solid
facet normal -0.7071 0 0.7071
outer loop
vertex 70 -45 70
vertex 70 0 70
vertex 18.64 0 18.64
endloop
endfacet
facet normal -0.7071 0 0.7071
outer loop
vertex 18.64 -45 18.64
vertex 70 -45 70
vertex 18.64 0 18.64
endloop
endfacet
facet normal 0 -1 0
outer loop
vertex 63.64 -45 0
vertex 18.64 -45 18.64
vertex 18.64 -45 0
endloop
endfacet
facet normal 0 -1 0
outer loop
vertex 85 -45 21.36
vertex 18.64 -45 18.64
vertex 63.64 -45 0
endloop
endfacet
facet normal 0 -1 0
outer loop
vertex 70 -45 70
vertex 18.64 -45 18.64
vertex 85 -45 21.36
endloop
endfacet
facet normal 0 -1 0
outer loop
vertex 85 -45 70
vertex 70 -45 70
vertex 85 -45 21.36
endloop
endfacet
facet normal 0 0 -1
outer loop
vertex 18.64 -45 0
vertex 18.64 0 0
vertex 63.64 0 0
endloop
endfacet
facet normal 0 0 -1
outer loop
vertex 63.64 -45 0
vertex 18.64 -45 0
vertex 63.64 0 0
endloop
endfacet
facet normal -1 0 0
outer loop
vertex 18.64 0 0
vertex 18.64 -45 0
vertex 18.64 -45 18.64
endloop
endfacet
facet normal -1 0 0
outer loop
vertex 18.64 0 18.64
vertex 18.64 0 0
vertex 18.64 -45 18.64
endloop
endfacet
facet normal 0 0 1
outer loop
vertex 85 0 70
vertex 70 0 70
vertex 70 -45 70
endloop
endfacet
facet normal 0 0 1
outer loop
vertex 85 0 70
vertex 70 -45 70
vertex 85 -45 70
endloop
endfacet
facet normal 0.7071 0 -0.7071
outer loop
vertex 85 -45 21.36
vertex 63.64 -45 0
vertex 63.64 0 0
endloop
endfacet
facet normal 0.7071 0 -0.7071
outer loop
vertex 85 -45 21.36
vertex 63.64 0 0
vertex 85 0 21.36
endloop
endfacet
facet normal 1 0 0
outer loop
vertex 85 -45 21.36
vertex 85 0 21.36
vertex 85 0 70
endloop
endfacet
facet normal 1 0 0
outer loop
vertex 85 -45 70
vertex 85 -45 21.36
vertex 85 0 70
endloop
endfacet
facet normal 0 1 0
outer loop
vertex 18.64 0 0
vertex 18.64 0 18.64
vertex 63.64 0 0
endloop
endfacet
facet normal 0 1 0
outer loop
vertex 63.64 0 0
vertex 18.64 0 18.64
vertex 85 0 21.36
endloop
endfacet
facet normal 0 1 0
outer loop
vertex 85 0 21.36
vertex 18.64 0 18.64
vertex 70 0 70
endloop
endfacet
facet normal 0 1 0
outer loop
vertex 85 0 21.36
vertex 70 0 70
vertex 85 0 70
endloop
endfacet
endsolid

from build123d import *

# Parameters (mm, degrees)
F1_DEPTH = 45
F3_DEPTH = 45.001
F5_DEPTH = 45.001


with BuildPart() as f1:
    # F0 (on Front) → F1 (new body)
    with BuildSketch(Plane.XZ):
        Polygon((85, 85), (0, 0), (63.63961, 0), (85, 21.36039), align=None)
    extrude(amount=F1_DEPTH)

    # F2 (on face) → F3 (cut, through all)
    with BuildSketch(Plane.XZ.offset(45)):
        Polygon((0, 0), (18.63961, 0), (18.63961, 18.63961), align=None)
    extrude(amount=-F3_DEPTH, mode=Mode.SUBTRACT)

    # F4 (on face) → F5 (cut, through all)
    with BuildSketch(Plane.XZ.offset(45)):
        Polygon((85, 85), (70, 70), (85, 70), align=None)
    extrude(amount=-F5_DEPTH, mode=Mode.SUBTRACT)


solid = f1.part
